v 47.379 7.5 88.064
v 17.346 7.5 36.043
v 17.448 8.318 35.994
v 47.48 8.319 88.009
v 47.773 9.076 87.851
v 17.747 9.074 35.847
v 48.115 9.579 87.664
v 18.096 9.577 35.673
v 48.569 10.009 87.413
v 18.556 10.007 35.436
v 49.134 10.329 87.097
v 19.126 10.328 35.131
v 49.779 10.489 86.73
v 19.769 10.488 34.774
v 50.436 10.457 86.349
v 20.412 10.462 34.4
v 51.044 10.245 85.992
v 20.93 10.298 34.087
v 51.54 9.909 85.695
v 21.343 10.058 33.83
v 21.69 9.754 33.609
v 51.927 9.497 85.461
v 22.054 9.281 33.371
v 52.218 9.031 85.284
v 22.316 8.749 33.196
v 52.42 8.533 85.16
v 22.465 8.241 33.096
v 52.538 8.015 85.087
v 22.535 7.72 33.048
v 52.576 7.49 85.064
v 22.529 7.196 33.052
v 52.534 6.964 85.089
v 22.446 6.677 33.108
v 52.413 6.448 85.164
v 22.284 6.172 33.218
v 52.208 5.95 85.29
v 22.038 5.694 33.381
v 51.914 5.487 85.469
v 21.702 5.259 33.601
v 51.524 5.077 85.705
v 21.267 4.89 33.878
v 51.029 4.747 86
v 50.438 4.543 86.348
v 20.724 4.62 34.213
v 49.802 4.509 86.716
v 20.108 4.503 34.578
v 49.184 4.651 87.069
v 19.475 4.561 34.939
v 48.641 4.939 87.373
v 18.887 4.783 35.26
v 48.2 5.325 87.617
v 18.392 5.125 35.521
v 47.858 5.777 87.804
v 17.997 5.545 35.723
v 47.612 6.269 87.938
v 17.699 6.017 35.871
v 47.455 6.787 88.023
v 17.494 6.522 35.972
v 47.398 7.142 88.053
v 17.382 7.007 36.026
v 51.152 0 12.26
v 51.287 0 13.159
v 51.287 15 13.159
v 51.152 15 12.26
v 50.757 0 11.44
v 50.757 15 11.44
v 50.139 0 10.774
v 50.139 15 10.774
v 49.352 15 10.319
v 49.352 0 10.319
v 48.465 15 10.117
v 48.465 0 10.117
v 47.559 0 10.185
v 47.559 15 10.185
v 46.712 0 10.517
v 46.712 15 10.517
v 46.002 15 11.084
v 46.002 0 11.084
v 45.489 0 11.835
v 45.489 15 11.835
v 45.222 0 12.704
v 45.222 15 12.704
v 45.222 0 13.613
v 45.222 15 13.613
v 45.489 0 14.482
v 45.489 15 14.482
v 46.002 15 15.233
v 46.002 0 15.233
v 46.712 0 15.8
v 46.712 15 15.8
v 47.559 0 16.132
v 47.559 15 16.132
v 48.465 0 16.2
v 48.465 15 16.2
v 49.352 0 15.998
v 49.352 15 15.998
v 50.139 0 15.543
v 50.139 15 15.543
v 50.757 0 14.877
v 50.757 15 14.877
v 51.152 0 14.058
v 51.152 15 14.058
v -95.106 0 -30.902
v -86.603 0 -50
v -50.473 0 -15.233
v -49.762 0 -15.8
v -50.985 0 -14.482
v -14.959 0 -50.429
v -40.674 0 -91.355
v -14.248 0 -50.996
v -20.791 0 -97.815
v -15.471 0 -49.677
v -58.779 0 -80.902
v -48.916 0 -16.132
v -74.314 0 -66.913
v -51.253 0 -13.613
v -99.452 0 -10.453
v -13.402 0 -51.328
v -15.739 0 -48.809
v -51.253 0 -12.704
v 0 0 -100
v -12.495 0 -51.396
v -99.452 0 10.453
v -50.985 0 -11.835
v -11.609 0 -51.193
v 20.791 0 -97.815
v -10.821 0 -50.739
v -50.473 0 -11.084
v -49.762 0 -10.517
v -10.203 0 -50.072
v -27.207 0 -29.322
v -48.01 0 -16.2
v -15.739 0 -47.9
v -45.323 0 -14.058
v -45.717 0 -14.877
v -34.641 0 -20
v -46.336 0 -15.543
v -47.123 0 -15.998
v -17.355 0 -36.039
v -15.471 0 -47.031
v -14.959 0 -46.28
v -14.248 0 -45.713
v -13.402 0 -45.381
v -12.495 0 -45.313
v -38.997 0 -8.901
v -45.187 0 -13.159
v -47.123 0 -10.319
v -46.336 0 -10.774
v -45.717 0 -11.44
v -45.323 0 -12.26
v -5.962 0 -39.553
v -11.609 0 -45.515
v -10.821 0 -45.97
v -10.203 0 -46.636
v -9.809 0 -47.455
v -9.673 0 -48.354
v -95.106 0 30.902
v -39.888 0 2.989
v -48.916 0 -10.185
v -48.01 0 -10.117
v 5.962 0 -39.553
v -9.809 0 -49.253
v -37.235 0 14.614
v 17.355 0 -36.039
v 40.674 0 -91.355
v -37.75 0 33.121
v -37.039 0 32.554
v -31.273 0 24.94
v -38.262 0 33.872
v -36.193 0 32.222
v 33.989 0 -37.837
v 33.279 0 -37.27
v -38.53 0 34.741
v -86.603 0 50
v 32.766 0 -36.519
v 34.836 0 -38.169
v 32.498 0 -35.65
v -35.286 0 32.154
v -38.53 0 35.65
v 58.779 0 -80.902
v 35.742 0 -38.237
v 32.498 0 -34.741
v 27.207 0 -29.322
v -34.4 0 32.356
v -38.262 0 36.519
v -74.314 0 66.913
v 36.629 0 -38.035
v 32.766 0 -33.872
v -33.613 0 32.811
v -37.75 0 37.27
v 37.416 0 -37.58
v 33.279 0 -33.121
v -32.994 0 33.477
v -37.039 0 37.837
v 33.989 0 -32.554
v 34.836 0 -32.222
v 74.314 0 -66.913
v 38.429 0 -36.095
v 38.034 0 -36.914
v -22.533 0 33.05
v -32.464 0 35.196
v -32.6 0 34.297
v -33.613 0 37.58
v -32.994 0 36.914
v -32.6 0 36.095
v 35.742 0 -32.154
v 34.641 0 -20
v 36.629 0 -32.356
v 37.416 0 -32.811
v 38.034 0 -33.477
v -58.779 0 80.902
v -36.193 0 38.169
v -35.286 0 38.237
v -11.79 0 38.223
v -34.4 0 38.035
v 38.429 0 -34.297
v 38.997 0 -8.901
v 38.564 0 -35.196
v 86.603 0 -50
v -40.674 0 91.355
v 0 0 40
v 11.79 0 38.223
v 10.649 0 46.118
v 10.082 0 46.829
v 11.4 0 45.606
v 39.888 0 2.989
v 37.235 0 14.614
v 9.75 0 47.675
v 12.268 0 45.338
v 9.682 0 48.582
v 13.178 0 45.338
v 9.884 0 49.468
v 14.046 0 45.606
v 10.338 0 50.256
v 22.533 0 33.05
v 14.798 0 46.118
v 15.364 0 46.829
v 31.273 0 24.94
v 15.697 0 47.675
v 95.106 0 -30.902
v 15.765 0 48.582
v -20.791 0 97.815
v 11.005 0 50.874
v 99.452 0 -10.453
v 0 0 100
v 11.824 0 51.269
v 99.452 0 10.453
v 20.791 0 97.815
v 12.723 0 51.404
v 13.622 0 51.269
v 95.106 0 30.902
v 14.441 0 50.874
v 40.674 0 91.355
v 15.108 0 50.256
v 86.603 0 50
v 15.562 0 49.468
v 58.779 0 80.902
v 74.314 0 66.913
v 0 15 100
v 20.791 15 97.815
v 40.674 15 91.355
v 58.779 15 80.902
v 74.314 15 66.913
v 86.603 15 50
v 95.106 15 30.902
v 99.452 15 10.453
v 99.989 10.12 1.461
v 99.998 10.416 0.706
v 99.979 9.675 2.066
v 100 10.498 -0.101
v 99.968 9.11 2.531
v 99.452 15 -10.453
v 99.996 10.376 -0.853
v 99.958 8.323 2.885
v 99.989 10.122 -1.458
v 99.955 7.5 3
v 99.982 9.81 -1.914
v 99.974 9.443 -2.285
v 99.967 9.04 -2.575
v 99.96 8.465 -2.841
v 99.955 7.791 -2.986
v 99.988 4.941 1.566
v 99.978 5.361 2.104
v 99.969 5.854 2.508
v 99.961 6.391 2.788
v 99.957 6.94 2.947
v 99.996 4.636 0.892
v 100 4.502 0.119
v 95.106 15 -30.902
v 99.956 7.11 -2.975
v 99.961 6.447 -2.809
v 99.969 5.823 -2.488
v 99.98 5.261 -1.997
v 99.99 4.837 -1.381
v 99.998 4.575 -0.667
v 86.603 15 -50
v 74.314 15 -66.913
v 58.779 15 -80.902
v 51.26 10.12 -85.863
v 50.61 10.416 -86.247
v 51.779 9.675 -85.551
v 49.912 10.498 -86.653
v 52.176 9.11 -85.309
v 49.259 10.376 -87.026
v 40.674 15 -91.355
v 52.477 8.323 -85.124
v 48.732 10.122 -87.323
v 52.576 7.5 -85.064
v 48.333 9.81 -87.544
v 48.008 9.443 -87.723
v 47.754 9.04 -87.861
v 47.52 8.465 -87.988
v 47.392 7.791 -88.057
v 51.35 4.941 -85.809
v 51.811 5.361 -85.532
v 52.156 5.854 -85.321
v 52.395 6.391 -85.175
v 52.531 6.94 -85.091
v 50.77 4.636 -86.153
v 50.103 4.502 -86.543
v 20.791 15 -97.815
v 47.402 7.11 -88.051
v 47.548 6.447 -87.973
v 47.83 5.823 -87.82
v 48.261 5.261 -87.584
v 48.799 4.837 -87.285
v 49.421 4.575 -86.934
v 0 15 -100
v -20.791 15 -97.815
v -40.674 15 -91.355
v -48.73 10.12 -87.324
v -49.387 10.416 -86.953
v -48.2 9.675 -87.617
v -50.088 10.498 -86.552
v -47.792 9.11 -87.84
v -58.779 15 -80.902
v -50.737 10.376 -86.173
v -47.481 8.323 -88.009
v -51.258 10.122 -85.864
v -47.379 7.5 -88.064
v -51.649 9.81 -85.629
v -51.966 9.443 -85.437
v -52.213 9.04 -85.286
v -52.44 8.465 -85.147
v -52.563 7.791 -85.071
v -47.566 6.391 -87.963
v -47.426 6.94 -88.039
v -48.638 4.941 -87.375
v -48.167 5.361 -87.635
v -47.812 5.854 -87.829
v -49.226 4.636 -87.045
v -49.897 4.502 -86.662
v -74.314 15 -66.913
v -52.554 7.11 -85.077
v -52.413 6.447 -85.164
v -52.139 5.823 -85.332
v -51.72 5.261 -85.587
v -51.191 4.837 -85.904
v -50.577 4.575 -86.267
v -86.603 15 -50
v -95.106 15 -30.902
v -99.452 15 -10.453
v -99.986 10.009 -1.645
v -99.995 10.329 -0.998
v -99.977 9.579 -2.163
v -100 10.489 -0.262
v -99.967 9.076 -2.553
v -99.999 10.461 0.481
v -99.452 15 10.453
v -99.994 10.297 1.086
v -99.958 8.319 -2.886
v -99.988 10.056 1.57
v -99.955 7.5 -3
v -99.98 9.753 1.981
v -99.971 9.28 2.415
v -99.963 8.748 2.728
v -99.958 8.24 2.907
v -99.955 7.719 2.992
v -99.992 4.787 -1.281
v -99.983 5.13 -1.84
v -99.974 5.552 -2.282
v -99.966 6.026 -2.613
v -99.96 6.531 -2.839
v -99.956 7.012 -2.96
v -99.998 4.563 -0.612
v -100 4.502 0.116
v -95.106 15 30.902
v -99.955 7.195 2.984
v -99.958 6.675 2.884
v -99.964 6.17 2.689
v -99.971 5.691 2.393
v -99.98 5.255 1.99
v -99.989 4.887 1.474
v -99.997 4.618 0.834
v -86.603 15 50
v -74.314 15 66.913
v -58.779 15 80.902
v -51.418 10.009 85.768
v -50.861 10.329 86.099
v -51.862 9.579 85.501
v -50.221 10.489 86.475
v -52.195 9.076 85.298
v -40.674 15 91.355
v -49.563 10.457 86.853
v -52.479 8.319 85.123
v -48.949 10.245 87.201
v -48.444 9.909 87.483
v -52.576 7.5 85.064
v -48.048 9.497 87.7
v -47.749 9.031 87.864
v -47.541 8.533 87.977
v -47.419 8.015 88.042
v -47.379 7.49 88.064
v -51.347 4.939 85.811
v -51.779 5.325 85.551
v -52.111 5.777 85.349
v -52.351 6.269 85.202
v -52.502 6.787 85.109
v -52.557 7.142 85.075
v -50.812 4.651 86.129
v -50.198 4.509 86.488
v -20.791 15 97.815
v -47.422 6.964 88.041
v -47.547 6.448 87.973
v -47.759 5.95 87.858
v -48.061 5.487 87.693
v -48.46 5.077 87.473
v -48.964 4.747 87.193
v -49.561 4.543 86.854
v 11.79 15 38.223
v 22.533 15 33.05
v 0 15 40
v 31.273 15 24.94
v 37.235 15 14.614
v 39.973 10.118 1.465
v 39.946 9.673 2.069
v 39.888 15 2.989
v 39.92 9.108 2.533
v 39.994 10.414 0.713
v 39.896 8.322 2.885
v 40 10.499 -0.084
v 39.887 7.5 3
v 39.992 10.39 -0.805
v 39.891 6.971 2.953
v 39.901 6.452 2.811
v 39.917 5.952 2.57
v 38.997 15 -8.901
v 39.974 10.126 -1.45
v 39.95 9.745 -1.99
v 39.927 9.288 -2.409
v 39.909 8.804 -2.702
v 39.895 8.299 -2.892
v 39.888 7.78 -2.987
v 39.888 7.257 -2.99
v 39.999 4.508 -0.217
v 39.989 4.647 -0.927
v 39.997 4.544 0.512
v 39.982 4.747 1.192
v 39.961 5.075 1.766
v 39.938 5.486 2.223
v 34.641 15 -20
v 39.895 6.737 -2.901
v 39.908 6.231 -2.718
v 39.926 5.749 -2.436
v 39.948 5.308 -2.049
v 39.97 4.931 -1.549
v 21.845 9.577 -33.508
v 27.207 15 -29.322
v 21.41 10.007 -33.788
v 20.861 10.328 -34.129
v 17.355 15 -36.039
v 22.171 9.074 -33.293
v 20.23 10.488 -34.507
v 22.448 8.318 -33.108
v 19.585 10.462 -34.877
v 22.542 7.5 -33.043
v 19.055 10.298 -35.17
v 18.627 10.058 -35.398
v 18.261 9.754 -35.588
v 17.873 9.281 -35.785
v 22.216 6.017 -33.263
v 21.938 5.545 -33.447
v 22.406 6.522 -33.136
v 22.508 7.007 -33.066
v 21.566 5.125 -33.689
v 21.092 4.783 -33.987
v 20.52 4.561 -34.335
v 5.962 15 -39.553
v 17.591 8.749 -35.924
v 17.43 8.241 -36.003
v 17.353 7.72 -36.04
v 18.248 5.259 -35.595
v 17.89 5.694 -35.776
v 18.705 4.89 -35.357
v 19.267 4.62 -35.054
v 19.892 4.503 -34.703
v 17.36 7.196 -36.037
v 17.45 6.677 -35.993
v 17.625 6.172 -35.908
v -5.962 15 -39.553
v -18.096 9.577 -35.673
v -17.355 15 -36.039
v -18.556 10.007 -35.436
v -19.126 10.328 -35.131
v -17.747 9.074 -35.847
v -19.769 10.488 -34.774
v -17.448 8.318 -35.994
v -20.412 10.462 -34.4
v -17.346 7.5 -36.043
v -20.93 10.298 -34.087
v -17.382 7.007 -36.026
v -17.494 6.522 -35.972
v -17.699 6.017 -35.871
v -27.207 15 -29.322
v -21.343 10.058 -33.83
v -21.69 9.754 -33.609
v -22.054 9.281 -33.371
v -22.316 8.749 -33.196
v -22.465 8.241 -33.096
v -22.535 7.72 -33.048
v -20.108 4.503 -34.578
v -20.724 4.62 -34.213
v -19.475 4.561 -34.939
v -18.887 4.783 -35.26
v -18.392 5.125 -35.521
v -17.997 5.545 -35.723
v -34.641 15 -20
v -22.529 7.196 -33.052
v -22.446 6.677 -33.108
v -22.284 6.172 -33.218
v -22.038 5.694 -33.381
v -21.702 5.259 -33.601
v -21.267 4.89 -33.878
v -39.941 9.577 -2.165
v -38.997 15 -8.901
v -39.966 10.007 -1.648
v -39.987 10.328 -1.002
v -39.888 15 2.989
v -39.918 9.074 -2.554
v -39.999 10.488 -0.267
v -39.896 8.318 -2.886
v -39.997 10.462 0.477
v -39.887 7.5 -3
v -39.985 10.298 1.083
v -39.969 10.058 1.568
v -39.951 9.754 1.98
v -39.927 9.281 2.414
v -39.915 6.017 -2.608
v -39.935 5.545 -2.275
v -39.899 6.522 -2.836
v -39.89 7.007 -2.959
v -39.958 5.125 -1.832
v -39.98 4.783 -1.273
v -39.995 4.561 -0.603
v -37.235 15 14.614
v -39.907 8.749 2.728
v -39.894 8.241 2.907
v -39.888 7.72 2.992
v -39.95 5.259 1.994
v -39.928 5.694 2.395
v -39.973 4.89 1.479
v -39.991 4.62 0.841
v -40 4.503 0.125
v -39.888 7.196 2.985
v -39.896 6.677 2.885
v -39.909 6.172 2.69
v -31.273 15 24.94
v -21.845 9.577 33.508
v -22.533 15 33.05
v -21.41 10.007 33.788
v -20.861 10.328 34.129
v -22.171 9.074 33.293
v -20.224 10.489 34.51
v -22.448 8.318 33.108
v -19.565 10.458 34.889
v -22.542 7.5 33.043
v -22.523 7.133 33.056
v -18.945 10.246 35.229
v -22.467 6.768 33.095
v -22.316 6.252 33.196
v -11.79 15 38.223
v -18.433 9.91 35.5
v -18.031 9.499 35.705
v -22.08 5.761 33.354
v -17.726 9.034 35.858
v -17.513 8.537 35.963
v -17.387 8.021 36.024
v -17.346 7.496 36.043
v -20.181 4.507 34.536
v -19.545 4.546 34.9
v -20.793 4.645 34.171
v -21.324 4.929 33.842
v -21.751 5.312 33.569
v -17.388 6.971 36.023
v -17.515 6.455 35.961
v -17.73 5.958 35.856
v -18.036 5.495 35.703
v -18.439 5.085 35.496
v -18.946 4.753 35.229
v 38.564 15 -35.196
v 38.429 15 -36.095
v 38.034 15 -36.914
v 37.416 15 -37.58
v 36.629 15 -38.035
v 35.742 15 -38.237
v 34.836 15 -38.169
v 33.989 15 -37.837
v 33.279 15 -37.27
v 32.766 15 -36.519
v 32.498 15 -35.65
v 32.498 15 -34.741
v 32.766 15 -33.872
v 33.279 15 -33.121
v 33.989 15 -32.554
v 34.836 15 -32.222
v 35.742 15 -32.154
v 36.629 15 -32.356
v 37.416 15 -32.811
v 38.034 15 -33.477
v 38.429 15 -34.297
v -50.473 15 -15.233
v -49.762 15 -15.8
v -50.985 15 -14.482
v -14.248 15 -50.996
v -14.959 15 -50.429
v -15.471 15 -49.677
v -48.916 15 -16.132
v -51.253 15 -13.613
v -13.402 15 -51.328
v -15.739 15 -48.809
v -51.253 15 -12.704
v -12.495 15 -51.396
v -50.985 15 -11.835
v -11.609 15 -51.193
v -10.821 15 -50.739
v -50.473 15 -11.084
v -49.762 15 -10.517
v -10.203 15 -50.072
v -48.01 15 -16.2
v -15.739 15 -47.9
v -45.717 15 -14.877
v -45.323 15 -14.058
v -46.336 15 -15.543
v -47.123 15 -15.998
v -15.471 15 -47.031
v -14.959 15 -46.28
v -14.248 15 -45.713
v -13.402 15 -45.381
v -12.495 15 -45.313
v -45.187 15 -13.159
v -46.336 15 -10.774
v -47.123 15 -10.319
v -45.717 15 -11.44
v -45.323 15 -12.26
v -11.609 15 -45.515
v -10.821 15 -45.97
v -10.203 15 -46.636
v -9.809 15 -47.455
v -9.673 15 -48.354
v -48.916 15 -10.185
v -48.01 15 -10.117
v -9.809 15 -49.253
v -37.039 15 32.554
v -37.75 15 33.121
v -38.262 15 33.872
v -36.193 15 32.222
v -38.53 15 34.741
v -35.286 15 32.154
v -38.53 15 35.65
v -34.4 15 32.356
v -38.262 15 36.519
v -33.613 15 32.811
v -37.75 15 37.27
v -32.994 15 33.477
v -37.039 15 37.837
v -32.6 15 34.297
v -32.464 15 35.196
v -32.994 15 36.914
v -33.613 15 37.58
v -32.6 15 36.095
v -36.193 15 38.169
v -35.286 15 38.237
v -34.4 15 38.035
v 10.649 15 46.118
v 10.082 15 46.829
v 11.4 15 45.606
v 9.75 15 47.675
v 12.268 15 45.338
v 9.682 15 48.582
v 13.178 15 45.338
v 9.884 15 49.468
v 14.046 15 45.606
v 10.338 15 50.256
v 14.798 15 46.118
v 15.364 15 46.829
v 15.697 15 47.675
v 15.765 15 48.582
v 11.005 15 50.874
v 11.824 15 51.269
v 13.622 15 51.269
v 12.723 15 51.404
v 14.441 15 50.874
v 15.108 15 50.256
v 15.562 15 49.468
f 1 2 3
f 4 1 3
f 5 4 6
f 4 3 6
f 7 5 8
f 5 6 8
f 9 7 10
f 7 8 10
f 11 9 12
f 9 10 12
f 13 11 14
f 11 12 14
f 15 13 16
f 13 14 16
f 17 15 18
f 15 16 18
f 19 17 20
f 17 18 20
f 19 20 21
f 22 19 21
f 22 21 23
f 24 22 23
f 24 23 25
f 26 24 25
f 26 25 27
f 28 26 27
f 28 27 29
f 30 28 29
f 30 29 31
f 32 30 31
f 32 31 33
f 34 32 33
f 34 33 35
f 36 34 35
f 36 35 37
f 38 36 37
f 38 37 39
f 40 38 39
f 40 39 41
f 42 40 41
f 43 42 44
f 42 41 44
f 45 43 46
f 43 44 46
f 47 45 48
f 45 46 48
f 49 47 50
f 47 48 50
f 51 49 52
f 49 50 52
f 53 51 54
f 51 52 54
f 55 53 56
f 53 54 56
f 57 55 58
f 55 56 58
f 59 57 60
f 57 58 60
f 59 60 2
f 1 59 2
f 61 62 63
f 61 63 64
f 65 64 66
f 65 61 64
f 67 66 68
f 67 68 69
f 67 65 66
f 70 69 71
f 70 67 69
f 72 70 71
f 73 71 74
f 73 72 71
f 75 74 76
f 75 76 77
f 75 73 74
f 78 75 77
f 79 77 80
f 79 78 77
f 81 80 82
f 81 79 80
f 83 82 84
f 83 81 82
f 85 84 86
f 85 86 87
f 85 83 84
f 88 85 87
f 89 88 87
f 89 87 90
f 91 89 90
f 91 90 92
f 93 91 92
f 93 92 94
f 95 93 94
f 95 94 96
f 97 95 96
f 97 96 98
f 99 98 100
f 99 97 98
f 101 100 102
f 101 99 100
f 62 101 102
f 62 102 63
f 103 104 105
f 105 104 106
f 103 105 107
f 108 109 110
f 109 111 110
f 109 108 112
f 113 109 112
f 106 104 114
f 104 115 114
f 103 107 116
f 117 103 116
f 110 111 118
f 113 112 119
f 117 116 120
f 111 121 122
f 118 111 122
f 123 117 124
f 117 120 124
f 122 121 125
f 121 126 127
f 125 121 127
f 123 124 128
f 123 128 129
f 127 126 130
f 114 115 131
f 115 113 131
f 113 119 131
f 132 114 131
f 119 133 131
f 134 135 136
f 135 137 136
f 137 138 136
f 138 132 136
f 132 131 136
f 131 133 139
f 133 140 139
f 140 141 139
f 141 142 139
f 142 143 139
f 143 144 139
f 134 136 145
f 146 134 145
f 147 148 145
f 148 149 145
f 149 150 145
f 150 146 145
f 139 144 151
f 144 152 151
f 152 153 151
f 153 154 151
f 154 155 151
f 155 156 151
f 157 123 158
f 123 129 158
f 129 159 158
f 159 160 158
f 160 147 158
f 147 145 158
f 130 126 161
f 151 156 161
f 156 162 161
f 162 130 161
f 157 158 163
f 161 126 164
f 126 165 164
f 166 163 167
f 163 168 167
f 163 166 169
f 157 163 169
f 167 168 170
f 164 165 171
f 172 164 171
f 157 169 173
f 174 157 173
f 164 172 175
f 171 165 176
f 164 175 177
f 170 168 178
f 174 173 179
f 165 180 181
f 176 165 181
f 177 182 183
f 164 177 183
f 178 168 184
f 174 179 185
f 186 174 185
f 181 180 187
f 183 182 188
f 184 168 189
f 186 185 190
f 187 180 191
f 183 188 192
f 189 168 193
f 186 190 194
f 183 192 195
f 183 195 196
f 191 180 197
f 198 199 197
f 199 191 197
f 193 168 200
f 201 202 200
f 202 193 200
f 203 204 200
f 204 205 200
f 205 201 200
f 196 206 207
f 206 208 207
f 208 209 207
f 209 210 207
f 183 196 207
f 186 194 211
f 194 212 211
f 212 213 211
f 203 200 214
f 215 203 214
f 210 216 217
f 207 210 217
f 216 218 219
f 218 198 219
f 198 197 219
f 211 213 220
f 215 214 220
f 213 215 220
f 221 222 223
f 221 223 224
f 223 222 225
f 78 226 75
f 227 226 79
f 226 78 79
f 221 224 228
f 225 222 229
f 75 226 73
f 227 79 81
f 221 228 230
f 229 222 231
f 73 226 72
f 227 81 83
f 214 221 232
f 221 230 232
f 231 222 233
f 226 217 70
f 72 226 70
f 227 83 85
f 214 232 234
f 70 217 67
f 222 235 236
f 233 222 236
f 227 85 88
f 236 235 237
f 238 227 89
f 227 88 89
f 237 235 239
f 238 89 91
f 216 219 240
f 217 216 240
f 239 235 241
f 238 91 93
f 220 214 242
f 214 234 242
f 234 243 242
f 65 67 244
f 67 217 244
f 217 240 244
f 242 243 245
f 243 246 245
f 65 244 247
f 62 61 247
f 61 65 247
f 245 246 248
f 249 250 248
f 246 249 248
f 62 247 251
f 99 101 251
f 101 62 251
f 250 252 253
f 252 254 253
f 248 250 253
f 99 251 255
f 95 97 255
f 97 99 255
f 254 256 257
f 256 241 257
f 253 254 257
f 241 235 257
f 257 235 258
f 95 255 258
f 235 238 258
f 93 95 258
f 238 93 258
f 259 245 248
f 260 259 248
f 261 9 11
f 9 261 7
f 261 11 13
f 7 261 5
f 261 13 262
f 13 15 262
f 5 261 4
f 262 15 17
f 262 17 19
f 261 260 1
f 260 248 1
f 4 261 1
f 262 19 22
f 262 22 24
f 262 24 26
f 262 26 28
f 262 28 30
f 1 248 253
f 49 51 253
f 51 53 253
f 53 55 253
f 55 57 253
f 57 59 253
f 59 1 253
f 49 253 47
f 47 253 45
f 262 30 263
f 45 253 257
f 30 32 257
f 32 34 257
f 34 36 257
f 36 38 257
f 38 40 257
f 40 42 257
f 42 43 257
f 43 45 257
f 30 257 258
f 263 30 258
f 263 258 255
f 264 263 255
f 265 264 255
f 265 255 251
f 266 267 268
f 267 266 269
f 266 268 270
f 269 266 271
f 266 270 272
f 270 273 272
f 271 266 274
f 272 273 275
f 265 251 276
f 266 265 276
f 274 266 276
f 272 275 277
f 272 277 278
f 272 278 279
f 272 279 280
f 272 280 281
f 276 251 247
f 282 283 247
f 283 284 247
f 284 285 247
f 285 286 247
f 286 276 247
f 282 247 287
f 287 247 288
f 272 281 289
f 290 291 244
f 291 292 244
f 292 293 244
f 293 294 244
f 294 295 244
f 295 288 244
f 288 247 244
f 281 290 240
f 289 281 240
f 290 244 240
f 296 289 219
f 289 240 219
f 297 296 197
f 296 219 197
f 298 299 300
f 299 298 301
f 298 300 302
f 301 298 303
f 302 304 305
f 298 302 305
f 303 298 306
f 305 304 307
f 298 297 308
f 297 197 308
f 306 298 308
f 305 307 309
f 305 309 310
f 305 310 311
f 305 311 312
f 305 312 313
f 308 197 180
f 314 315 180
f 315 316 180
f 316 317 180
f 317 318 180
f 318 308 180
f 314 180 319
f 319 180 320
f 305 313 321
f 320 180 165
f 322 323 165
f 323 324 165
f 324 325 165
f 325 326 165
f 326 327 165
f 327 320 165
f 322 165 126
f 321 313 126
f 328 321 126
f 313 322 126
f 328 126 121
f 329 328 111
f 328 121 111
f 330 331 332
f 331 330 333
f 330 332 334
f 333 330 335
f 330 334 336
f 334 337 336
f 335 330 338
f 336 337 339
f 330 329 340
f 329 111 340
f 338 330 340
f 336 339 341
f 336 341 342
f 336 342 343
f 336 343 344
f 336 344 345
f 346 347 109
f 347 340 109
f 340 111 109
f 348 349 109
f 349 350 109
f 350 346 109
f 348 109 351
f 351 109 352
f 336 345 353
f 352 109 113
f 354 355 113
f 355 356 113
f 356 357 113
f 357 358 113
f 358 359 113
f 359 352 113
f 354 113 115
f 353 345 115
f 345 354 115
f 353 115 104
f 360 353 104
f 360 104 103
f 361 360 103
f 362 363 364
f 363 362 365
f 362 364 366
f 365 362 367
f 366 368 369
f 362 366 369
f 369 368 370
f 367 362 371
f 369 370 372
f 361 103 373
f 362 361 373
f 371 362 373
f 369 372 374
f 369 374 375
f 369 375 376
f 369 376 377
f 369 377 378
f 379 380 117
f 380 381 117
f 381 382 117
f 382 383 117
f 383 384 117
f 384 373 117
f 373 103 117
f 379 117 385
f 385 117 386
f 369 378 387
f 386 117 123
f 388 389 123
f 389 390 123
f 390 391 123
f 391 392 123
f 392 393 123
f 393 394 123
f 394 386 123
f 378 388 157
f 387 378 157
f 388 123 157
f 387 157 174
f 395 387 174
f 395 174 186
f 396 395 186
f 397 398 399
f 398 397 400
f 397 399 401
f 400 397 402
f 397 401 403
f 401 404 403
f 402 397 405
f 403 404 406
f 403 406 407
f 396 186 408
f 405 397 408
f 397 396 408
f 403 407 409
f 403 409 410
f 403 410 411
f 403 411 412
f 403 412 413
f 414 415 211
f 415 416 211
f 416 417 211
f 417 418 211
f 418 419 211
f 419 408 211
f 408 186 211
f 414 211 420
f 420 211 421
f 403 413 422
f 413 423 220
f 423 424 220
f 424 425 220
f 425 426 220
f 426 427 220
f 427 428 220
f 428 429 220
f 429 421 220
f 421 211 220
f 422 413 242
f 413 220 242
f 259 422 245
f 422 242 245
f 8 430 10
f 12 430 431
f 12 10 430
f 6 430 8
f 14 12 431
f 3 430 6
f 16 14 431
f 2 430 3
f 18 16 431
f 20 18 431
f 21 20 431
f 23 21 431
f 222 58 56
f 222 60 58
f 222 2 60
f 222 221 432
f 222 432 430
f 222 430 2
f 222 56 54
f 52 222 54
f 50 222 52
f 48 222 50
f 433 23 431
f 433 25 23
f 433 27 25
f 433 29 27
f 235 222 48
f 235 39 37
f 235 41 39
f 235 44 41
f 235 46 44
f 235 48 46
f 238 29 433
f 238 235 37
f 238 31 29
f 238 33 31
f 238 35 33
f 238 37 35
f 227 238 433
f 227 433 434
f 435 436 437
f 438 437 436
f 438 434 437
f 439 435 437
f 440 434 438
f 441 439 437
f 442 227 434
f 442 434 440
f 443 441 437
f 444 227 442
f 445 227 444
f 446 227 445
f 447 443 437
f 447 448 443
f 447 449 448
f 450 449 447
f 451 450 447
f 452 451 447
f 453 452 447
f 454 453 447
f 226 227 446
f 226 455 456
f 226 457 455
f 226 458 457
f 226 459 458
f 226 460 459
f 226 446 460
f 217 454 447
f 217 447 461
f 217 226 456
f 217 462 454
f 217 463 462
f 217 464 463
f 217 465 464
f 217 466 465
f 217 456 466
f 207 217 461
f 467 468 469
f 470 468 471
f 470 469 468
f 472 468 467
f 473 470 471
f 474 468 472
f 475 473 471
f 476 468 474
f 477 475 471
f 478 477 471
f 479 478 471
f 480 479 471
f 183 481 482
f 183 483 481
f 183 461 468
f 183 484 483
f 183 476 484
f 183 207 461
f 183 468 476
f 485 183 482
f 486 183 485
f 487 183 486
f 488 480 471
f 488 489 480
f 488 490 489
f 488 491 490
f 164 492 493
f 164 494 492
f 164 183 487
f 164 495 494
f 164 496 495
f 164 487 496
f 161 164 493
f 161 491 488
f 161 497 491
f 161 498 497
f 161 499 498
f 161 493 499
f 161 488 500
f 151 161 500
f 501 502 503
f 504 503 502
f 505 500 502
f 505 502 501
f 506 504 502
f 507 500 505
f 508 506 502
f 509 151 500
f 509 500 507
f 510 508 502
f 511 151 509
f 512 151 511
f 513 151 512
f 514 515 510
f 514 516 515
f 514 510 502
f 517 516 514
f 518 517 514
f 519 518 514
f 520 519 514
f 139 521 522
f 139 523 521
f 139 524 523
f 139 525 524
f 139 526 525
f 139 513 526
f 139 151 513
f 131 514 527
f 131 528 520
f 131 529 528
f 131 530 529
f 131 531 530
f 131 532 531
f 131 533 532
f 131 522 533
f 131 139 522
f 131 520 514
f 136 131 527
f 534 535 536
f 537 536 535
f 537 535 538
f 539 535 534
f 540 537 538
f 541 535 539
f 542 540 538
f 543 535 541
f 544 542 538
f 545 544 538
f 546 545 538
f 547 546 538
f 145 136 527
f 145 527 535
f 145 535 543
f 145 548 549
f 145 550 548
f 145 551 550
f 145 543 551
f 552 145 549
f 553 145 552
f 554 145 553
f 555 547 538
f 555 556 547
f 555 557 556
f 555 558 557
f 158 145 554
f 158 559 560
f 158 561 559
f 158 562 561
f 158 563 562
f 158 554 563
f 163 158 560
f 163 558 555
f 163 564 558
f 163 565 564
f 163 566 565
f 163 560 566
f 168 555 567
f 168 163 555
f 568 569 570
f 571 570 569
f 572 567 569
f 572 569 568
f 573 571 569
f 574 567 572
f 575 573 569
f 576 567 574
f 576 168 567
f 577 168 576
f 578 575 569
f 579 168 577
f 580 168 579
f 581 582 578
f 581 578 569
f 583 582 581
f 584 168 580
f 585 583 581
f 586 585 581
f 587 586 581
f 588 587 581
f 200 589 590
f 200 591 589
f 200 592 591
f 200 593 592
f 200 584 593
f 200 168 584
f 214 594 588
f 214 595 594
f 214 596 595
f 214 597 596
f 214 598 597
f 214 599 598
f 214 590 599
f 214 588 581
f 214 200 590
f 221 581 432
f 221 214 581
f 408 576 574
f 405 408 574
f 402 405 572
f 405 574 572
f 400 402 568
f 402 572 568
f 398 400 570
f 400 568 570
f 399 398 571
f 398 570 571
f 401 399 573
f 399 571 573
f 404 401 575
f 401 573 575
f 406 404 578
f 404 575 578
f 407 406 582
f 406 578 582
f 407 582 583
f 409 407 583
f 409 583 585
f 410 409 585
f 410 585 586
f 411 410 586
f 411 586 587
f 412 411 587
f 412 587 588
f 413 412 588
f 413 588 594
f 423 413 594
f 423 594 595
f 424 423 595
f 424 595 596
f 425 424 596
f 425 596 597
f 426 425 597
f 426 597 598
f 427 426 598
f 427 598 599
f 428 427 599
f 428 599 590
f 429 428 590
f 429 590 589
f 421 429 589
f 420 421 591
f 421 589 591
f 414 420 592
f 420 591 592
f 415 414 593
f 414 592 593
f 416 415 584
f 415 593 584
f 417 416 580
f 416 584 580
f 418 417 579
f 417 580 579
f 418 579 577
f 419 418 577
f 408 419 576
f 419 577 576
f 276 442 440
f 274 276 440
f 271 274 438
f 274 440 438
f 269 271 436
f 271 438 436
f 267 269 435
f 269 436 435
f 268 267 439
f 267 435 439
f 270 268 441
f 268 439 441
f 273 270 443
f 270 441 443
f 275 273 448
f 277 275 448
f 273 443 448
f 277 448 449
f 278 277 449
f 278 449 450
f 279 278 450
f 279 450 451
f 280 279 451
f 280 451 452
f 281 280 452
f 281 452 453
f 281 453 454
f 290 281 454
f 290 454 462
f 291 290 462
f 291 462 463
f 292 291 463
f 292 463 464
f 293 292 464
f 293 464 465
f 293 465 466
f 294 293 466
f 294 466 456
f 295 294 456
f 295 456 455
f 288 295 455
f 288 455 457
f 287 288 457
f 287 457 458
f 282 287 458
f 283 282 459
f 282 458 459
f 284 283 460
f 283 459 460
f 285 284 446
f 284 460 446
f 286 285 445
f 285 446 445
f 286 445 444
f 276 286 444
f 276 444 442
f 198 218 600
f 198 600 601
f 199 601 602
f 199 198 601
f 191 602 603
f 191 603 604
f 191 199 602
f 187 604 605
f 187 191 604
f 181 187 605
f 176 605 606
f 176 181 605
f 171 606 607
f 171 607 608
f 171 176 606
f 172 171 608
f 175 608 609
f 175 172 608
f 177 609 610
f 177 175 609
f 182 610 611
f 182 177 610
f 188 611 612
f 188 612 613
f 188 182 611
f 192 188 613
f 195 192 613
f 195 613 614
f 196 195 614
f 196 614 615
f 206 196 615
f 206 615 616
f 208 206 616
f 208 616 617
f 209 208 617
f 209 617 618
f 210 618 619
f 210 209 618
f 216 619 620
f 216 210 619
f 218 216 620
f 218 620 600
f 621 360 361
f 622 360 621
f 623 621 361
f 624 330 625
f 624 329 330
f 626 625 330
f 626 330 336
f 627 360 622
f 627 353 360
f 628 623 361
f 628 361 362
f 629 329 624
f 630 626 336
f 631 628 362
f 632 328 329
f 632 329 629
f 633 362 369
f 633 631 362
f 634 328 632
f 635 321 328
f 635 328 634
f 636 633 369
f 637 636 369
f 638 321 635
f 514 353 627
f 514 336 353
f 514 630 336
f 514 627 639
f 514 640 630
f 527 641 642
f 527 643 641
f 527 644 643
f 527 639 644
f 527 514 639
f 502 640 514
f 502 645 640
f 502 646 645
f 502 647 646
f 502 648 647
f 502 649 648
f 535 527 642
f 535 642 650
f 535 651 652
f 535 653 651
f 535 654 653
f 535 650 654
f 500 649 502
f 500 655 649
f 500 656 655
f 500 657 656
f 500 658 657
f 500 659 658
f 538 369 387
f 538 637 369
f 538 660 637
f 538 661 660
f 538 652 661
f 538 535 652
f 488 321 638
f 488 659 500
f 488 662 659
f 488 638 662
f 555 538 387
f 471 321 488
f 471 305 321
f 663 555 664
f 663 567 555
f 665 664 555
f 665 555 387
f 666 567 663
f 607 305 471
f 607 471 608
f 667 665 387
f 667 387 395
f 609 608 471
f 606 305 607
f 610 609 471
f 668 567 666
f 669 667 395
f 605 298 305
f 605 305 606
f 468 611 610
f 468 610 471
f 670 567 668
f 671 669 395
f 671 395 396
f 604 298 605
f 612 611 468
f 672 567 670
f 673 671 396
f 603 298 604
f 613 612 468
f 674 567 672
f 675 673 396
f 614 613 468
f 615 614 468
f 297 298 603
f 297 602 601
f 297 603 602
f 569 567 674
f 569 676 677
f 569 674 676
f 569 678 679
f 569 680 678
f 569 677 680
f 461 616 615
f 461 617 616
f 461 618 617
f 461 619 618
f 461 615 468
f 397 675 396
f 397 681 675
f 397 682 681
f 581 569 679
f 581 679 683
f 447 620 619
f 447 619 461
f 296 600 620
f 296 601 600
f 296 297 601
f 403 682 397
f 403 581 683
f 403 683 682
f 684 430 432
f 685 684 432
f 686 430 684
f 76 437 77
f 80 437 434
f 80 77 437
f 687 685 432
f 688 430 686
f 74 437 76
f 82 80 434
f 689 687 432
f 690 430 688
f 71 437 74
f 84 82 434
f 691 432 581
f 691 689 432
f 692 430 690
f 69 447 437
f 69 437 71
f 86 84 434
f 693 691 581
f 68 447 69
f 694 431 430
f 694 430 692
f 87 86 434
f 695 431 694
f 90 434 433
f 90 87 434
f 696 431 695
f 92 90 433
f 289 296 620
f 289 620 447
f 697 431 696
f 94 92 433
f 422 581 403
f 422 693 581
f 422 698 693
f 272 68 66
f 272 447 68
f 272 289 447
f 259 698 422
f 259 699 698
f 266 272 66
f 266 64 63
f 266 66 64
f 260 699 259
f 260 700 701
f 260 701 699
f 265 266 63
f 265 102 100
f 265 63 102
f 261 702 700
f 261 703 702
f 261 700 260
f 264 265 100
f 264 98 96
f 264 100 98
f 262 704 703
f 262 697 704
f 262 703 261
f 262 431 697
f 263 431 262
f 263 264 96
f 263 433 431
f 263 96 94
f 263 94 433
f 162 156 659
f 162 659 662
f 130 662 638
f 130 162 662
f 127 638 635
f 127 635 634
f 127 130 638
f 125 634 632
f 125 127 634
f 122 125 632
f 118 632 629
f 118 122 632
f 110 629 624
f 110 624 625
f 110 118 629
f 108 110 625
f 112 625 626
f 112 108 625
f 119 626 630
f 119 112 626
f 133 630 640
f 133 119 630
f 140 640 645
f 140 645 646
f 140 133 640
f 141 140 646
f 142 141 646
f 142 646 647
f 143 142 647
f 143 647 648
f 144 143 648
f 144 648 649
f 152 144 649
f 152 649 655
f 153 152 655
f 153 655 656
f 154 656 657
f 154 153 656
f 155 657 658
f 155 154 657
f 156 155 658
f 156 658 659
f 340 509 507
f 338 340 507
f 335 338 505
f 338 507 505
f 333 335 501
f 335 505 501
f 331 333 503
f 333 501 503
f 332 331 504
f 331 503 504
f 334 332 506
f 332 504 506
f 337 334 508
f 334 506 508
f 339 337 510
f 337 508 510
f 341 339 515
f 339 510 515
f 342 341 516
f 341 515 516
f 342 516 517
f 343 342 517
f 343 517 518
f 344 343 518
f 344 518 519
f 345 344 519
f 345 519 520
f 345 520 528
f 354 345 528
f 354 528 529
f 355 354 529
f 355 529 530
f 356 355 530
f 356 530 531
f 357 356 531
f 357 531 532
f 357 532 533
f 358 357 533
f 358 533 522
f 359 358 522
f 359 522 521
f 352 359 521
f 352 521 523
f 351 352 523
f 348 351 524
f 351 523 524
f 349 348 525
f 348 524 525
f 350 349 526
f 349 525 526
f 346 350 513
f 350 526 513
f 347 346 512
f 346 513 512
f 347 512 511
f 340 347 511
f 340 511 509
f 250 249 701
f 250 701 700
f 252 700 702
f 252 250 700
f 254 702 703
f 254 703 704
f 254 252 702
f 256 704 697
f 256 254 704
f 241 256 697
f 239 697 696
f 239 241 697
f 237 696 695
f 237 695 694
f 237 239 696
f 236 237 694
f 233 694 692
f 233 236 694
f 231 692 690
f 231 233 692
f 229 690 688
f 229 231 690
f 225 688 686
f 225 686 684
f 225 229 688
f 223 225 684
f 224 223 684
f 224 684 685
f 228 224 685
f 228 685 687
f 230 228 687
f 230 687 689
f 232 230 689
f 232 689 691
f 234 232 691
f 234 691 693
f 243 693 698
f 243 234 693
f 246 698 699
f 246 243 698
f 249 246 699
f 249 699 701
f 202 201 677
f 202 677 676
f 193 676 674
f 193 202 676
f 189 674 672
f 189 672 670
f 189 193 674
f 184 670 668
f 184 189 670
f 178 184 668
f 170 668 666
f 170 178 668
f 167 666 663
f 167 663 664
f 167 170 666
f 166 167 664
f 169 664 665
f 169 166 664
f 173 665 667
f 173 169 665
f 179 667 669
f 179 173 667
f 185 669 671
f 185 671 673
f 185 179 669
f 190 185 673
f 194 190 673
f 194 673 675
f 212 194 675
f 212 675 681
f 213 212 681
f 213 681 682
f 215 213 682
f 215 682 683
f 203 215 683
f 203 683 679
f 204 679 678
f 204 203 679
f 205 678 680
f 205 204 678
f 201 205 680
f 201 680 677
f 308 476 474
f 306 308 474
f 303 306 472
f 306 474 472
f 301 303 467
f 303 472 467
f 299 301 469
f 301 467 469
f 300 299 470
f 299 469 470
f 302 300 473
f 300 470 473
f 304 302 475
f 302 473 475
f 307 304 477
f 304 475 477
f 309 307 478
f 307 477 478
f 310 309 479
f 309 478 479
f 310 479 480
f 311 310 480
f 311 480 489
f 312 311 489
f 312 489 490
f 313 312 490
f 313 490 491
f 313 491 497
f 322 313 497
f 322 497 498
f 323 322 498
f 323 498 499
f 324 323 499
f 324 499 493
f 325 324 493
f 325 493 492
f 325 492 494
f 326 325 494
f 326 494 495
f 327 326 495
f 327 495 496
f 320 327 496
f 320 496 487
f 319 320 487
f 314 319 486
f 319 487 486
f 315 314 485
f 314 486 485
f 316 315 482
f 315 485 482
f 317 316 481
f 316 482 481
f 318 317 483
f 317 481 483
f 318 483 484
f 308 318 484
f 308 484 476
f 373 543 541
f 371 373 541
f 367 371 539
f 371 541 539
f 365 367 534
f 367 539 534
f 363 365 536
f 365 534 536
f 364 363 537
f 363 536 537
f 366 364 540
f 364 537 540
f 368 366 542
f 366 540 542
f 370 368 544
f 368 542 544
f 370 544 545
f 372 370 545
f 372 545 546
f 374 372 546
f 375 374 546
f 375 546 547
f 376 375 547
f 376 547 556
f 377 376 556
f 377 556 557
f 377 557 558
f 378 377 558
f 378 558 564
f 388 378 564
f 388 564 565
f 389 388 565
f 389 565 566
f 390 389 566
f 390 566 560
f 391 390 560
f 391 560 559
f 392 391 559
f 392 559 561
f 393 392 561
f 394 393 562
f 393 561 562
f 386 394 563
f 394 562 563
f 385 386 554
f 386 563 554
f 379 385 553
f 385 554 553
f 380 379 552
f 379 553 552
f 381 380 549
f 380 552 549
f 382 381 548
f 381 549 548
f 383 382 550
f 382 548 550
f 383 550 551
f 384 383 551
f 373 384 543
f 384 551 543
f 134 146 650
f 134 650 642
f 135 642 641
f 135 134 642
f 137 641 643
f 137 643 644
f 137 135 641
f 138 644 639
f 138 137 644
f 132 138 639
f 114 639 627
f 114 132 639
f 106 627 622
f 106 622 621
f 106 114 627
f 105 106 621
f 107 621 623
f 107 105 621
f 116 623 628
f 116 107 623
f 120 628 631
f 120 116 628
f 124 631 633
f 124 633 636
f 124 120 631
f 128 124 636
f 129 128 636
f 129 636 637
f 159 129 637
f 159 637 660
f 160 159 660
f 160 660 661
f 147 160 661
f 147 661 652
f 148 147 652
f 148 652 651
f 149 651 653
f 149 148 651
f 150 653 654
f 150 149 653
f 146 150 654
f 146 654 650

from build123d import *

# Parameters (mm, degrees)
SKETCH1_R             = 100
SKETCH1_R_2           = 40
SKETCH1_R_3           = 3.05
BOSS_EXTRUDE1_DEPTH   = 15
SKETCH2_R             = 3
CUT_EXTRUDE1_DEPTH    = 143.214626533
CIRPATTERN1_COUNT     = 6
CIRPATTERN2_OUTLINE_R = 3.05
CIRPATTERN2_DEPTH     = 15


# Read off the part's stored shape, not the designer's step: CirPattern2
with BuildPart() as part:
    # Sketch1 → Boss-Extrude1 (new body)
    with BuildSketch(Plane(origin=(0, 0, 0), x_dir=(1, 0, 0), z_dir=(0, 1, 0))):
        with Locations(Location((0, 0, 0), (0, 0, 270))):
            Circle(SKETCH1_R)
        with Locations(Location((0, 0, 0), (0, 0, 270))):
            Circle(SKETCH1_R_2, mode=Mode.SUBTRACT)
        with Locations(Location((12.723046489, -48.354152749, 0), (0, 0, 270))):
            Circle(SKETCH1_R_3, mode=Mode.SUBTRACT)
    extrude(amount=BOSS_EXTRUDE1_DEPTH)

    # Sketch2 → Cut-Extrude1 (cut, through all)
    with BuildSketch(Plane(origin=(0, 0, 0), x_dir=(0, 0, -1), z_dir=(1, 0, 0))):
        with Locations((0, 7.5)):
            Circle(SKETCH2_R)
    cut_extrude1 = extrude(amount=-CUT_EXTRUDE1_DEPTH, mode=Mode.SUBTRACT)

    # CirPattern1: Cut-Extrude1 ×6 about axis
    cirpattern1_axis = Axis((0, 15, 0), (0, 1, 0))
    for i in range(1, CIRPATTERN1_COUNT):
        add(cut_extrude1.rotate(cirpattern1_axis, i * 360 / CIRPATTERN1_COUNT), mode=Mode.SUBTRACT)

    # CirPattern2 outline → CirPattern2 (cut)
    with BuildSketch(Plane(origin=(0, 0, 0), x_dir=(1, 0, 0), z_dir=(0, 1, 0))):
        with Locations((-35.514401414, -35.195557847)):
            Circle(CIRPATTERN2_OUTLINE_R)
        with Locations((-48.237447903, 13.158594901)):
            Circle(CIRPATTERN2_OUTLINE_R)
        with Locations((-12.723046489, 48.354152749)):
            Circle(CIRPATTERN2_OUTLINE_R)
        with Locations((35.514401414, 35.195557847)):
            Circle(CIRPATTERN2_OUTLINE_R)
        with Locations((48.237447903, -13.158594901)):
            Circle(CIRPATTERN2_OUTLINE_R)
    extrude(amount=CIRPATTERN2_DEPTH, mode=Mode.SUBTRACT)


solid = part.part
